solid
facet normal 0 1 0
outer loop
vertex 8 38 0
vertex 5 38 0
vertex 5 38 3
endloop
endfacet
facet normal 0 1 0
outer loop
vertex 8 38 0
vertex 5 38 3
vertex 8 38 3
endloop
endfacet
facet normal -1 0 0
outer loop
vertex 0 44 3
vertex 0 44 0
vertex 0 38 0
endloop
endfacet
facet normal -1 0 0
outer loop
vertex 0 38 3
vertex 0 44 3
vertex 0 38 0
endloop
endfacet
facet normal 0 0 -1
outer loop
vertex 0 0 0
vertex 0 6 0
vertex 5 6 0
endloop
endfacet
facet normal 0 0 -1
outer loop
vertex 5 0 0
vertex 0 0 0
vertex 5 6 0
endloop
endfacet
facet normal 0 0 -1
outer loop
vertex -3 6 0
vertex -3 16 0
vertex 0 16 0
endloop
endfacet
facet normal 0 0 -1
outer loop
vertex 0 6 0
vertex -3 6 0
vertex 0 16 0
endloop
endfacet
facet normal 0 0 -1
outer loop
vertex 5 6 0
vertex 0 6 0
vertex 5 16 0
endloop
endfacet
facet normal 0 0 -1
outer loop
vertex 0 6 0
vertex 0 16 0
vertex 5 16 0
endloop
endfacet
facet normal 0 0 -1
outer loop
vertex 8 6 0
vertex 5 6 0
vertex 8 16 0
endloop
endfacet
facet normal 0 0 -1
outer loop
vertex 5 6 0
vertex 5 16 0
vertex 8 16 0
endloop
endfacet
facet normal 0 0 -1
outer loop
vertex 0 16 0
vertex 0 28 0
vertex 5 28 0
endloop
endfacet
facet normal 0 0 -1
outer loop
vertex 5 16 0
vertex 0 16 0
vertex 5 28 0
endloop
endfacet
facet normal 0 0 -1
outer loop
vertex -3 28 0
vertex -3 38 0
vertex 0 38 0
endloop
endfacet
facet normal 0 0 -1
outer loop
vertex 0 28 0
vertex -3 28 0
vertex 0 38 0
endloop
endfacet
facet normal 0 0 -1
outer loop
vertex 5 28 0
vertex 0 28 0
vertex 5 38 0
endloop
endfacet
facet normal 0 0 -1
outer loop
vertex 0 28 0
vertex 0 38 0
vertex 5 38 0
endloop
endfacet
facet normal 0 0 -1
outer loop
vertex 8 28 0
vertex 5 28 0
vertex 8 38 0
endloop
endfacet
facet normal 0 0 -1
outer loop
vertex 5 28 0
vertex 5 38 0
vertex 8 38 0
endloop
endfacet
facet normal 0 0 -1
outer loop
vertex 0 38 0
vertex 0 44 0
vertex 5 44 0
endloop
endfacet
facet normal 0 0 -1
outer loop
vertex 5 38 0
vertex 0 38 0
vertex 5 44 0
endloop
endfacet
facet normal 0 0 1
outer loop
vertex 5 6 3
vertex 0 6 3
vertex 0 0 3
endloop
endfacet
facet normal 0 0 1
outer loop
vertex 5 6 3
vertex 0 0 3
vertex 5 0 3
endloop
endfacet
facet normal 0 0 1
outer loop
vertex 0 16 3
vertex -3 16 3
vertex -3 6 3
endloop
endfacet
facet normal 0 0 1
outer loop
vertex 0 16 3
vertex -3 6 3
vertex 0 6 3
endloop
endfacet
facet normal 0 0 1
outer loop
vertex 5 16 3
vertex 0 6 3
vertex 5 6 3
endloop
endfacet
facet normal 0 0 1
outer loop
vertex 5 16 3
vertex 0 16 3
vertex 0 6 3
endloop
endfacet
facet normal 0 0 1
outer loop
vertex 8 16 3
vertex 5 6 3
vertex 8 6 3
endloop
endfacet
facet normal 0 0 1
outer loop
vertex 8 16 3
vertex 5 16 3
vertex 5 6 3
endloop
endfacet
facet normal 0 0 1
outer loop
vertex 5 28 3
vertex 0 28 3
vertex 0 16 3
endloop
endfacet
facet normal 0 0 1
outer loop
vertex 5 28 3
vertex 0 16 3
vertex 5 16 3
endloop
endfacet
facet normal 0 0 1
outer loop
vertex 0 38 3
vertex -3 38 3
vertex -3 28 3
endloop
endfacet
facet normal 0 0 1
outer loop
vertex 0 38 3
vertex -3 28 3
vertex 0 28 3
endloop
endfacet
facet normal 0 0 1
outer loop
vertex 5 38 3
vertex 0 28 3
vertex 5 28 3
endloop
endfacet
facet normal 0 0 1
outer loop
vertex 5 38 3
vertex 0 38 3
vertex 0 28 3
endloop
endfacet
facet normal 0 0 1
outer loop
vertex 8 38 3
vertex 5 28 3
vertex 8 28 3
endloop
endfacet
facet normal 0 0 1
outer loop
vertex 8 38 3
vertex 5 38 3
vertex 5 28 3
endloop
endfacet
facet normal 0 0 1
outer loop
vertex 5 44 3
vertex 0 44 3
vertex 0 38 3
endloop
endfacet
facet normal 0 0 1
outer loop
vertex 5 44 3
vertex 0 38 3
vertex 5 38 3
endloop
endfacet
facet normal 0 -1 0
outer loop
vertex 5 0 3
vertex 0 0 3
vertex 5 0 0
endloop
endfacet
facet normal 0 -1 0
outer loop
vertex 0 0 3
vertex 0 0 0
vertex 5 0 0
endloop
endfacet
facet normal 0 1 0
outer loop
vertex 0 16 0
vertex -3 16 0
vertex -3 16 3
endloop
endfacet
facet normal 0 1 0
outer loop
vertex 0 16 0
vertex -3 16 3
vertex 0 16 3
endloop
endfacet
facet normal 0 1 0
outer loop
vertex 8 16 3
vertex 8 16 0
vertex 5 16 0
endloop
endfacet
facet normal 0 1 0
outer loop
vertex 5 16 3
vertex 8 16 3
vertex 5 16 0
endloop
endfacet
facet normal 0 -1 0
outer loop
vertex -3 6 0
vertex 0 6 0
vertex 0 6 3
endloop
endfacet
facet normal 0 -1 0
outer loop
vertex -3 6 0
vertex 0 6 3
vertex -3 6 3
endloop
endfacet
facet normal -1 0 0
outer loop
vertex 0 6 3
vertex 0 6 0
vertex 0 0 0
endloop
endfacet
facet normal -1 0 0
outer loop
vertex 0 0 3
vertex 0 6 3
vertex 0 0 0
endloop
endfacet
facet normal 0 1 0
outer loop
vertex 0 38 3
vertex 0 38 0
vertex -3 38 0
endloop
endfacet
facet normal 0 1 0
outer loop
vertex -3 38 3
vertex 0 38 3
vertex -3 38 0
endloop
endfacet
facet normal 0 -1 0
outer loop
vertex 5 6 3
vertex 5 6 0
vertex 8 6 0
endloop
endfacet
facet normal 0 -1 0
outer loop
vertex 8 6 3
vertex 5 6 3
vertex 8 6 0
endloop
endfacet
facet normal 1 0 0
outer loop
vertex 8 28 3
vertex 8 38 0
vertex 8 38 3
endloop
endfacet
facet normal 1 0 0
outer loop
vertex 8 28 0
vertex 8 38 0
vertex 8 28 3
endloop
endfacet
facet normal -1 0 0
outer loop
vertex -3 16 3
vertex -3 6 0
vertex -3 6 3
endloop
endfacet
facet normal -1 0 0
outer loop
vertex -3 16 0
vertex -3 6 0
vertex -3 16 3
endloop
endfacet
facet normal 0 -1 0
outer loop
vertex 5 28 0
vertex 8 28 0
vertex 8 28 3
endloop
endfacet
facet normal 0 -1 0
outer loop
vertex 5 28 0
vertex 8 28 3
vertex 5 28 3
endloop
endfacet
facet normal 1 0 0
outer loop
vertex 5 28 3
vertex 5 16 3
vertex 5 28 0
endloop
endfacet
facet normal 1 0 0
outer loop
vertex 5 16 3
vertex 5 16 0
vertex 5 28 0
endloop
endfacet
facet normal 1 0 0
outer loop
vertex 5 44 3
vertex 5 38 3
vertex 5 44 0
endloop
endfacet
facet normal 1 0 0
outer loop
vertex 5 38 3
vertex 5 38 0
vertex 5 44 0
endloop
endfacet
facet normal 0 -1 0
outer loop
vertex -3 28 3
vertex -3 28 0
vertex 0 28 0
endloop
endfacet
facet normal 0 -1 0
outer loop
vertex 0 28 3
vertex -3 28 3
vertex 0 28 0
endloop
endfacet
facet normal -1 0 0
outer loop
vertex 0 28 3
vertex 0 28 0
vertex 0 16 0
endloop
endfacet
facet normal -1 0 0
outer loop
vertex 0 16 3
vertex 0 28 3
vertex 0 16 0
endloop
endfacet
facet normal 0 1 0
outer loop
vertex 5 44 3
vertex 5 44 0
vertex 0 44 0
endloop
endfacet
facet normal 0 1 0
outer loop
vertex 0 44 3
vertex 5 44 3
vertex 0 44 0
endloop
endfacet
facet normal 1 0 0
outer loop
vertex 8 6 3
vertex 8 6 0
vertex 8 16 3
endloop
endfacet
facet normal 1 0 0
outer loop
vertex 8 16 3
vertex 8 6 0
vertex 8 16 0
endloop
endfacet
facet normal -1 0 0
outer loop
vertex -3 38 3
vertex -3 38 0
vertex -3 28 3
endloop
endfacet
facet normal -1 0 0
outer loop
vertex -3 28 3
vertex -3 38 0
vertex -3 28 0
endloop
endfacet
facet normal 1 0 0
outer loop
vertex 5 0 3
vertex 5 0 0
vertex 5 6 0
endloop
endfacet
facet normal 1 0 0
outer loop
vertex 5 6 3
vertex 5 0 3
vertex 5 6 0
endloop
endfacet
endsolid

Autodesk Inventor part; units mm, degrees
ref_plane "YZ Plane" through (0, 0, 0) normal (1, 0, 0) x (0, 1, 0)
ref_plane "XZ Plane" through (0, 0, 0) normal (0, 1, 0) x (-1, 0, 0)
ref_plane "XY Plane" through (0, 0, 0) normal (0, 0, 1) x (1, 0, 0)
sketch "Sketch1" plane through (0, 0, 0) normal (0, 0, 1) x (1, 0, 0)
  line L0 (0, 0) -> (5, 0)
  line L1 (5, 0) -> (5, 44)
  line L2 (5, 44) -> (0, 44)
  line L3 (0, 44) -> (0, 0)
  line L4 (5, 6) -> (8, 6)
  line L5 (8, 6) -> (8, 16)
  line L6 (8, 16) -> (5, 16)
  line L7 (5, 16) -> (5, 6)
  line L8 (5, 22) -> (0, 22) construction
  line L9 (2.5, 22) -> (2.5, 0) construction
  line L10 (0, 6) -> (-3, 6)
  line L11 (-3, 6) -> (-3, 16)
  line L12 (-3, 16) -> (0, 16)
  line L13 (5, 38) -> (8, 38)
  line L14 (8, 38) -> (8, 28)
  line L15 (8, 28) -> (5, 28)
  line L16 (-3, 28) -> (0, 28)
  line L17 (-3, 38) -> (-3, 28)
  line L18 (0, 38) -> (-3, 38)
  point P0 (6.5, 6)
  point P1 (-1.5, 6)
  point P2 (6.5, 38)
  point P3 (-1.5, 38)
  dimension "d0" = 5
  dimension "d1" = 44
  dimension "d2" = 3
  dimension "d3" = 6
  dimension "d4" = 10
extrude "Extrusion1" add sketch "Sketch1" along normal blind 3
properties part number "columna2"
